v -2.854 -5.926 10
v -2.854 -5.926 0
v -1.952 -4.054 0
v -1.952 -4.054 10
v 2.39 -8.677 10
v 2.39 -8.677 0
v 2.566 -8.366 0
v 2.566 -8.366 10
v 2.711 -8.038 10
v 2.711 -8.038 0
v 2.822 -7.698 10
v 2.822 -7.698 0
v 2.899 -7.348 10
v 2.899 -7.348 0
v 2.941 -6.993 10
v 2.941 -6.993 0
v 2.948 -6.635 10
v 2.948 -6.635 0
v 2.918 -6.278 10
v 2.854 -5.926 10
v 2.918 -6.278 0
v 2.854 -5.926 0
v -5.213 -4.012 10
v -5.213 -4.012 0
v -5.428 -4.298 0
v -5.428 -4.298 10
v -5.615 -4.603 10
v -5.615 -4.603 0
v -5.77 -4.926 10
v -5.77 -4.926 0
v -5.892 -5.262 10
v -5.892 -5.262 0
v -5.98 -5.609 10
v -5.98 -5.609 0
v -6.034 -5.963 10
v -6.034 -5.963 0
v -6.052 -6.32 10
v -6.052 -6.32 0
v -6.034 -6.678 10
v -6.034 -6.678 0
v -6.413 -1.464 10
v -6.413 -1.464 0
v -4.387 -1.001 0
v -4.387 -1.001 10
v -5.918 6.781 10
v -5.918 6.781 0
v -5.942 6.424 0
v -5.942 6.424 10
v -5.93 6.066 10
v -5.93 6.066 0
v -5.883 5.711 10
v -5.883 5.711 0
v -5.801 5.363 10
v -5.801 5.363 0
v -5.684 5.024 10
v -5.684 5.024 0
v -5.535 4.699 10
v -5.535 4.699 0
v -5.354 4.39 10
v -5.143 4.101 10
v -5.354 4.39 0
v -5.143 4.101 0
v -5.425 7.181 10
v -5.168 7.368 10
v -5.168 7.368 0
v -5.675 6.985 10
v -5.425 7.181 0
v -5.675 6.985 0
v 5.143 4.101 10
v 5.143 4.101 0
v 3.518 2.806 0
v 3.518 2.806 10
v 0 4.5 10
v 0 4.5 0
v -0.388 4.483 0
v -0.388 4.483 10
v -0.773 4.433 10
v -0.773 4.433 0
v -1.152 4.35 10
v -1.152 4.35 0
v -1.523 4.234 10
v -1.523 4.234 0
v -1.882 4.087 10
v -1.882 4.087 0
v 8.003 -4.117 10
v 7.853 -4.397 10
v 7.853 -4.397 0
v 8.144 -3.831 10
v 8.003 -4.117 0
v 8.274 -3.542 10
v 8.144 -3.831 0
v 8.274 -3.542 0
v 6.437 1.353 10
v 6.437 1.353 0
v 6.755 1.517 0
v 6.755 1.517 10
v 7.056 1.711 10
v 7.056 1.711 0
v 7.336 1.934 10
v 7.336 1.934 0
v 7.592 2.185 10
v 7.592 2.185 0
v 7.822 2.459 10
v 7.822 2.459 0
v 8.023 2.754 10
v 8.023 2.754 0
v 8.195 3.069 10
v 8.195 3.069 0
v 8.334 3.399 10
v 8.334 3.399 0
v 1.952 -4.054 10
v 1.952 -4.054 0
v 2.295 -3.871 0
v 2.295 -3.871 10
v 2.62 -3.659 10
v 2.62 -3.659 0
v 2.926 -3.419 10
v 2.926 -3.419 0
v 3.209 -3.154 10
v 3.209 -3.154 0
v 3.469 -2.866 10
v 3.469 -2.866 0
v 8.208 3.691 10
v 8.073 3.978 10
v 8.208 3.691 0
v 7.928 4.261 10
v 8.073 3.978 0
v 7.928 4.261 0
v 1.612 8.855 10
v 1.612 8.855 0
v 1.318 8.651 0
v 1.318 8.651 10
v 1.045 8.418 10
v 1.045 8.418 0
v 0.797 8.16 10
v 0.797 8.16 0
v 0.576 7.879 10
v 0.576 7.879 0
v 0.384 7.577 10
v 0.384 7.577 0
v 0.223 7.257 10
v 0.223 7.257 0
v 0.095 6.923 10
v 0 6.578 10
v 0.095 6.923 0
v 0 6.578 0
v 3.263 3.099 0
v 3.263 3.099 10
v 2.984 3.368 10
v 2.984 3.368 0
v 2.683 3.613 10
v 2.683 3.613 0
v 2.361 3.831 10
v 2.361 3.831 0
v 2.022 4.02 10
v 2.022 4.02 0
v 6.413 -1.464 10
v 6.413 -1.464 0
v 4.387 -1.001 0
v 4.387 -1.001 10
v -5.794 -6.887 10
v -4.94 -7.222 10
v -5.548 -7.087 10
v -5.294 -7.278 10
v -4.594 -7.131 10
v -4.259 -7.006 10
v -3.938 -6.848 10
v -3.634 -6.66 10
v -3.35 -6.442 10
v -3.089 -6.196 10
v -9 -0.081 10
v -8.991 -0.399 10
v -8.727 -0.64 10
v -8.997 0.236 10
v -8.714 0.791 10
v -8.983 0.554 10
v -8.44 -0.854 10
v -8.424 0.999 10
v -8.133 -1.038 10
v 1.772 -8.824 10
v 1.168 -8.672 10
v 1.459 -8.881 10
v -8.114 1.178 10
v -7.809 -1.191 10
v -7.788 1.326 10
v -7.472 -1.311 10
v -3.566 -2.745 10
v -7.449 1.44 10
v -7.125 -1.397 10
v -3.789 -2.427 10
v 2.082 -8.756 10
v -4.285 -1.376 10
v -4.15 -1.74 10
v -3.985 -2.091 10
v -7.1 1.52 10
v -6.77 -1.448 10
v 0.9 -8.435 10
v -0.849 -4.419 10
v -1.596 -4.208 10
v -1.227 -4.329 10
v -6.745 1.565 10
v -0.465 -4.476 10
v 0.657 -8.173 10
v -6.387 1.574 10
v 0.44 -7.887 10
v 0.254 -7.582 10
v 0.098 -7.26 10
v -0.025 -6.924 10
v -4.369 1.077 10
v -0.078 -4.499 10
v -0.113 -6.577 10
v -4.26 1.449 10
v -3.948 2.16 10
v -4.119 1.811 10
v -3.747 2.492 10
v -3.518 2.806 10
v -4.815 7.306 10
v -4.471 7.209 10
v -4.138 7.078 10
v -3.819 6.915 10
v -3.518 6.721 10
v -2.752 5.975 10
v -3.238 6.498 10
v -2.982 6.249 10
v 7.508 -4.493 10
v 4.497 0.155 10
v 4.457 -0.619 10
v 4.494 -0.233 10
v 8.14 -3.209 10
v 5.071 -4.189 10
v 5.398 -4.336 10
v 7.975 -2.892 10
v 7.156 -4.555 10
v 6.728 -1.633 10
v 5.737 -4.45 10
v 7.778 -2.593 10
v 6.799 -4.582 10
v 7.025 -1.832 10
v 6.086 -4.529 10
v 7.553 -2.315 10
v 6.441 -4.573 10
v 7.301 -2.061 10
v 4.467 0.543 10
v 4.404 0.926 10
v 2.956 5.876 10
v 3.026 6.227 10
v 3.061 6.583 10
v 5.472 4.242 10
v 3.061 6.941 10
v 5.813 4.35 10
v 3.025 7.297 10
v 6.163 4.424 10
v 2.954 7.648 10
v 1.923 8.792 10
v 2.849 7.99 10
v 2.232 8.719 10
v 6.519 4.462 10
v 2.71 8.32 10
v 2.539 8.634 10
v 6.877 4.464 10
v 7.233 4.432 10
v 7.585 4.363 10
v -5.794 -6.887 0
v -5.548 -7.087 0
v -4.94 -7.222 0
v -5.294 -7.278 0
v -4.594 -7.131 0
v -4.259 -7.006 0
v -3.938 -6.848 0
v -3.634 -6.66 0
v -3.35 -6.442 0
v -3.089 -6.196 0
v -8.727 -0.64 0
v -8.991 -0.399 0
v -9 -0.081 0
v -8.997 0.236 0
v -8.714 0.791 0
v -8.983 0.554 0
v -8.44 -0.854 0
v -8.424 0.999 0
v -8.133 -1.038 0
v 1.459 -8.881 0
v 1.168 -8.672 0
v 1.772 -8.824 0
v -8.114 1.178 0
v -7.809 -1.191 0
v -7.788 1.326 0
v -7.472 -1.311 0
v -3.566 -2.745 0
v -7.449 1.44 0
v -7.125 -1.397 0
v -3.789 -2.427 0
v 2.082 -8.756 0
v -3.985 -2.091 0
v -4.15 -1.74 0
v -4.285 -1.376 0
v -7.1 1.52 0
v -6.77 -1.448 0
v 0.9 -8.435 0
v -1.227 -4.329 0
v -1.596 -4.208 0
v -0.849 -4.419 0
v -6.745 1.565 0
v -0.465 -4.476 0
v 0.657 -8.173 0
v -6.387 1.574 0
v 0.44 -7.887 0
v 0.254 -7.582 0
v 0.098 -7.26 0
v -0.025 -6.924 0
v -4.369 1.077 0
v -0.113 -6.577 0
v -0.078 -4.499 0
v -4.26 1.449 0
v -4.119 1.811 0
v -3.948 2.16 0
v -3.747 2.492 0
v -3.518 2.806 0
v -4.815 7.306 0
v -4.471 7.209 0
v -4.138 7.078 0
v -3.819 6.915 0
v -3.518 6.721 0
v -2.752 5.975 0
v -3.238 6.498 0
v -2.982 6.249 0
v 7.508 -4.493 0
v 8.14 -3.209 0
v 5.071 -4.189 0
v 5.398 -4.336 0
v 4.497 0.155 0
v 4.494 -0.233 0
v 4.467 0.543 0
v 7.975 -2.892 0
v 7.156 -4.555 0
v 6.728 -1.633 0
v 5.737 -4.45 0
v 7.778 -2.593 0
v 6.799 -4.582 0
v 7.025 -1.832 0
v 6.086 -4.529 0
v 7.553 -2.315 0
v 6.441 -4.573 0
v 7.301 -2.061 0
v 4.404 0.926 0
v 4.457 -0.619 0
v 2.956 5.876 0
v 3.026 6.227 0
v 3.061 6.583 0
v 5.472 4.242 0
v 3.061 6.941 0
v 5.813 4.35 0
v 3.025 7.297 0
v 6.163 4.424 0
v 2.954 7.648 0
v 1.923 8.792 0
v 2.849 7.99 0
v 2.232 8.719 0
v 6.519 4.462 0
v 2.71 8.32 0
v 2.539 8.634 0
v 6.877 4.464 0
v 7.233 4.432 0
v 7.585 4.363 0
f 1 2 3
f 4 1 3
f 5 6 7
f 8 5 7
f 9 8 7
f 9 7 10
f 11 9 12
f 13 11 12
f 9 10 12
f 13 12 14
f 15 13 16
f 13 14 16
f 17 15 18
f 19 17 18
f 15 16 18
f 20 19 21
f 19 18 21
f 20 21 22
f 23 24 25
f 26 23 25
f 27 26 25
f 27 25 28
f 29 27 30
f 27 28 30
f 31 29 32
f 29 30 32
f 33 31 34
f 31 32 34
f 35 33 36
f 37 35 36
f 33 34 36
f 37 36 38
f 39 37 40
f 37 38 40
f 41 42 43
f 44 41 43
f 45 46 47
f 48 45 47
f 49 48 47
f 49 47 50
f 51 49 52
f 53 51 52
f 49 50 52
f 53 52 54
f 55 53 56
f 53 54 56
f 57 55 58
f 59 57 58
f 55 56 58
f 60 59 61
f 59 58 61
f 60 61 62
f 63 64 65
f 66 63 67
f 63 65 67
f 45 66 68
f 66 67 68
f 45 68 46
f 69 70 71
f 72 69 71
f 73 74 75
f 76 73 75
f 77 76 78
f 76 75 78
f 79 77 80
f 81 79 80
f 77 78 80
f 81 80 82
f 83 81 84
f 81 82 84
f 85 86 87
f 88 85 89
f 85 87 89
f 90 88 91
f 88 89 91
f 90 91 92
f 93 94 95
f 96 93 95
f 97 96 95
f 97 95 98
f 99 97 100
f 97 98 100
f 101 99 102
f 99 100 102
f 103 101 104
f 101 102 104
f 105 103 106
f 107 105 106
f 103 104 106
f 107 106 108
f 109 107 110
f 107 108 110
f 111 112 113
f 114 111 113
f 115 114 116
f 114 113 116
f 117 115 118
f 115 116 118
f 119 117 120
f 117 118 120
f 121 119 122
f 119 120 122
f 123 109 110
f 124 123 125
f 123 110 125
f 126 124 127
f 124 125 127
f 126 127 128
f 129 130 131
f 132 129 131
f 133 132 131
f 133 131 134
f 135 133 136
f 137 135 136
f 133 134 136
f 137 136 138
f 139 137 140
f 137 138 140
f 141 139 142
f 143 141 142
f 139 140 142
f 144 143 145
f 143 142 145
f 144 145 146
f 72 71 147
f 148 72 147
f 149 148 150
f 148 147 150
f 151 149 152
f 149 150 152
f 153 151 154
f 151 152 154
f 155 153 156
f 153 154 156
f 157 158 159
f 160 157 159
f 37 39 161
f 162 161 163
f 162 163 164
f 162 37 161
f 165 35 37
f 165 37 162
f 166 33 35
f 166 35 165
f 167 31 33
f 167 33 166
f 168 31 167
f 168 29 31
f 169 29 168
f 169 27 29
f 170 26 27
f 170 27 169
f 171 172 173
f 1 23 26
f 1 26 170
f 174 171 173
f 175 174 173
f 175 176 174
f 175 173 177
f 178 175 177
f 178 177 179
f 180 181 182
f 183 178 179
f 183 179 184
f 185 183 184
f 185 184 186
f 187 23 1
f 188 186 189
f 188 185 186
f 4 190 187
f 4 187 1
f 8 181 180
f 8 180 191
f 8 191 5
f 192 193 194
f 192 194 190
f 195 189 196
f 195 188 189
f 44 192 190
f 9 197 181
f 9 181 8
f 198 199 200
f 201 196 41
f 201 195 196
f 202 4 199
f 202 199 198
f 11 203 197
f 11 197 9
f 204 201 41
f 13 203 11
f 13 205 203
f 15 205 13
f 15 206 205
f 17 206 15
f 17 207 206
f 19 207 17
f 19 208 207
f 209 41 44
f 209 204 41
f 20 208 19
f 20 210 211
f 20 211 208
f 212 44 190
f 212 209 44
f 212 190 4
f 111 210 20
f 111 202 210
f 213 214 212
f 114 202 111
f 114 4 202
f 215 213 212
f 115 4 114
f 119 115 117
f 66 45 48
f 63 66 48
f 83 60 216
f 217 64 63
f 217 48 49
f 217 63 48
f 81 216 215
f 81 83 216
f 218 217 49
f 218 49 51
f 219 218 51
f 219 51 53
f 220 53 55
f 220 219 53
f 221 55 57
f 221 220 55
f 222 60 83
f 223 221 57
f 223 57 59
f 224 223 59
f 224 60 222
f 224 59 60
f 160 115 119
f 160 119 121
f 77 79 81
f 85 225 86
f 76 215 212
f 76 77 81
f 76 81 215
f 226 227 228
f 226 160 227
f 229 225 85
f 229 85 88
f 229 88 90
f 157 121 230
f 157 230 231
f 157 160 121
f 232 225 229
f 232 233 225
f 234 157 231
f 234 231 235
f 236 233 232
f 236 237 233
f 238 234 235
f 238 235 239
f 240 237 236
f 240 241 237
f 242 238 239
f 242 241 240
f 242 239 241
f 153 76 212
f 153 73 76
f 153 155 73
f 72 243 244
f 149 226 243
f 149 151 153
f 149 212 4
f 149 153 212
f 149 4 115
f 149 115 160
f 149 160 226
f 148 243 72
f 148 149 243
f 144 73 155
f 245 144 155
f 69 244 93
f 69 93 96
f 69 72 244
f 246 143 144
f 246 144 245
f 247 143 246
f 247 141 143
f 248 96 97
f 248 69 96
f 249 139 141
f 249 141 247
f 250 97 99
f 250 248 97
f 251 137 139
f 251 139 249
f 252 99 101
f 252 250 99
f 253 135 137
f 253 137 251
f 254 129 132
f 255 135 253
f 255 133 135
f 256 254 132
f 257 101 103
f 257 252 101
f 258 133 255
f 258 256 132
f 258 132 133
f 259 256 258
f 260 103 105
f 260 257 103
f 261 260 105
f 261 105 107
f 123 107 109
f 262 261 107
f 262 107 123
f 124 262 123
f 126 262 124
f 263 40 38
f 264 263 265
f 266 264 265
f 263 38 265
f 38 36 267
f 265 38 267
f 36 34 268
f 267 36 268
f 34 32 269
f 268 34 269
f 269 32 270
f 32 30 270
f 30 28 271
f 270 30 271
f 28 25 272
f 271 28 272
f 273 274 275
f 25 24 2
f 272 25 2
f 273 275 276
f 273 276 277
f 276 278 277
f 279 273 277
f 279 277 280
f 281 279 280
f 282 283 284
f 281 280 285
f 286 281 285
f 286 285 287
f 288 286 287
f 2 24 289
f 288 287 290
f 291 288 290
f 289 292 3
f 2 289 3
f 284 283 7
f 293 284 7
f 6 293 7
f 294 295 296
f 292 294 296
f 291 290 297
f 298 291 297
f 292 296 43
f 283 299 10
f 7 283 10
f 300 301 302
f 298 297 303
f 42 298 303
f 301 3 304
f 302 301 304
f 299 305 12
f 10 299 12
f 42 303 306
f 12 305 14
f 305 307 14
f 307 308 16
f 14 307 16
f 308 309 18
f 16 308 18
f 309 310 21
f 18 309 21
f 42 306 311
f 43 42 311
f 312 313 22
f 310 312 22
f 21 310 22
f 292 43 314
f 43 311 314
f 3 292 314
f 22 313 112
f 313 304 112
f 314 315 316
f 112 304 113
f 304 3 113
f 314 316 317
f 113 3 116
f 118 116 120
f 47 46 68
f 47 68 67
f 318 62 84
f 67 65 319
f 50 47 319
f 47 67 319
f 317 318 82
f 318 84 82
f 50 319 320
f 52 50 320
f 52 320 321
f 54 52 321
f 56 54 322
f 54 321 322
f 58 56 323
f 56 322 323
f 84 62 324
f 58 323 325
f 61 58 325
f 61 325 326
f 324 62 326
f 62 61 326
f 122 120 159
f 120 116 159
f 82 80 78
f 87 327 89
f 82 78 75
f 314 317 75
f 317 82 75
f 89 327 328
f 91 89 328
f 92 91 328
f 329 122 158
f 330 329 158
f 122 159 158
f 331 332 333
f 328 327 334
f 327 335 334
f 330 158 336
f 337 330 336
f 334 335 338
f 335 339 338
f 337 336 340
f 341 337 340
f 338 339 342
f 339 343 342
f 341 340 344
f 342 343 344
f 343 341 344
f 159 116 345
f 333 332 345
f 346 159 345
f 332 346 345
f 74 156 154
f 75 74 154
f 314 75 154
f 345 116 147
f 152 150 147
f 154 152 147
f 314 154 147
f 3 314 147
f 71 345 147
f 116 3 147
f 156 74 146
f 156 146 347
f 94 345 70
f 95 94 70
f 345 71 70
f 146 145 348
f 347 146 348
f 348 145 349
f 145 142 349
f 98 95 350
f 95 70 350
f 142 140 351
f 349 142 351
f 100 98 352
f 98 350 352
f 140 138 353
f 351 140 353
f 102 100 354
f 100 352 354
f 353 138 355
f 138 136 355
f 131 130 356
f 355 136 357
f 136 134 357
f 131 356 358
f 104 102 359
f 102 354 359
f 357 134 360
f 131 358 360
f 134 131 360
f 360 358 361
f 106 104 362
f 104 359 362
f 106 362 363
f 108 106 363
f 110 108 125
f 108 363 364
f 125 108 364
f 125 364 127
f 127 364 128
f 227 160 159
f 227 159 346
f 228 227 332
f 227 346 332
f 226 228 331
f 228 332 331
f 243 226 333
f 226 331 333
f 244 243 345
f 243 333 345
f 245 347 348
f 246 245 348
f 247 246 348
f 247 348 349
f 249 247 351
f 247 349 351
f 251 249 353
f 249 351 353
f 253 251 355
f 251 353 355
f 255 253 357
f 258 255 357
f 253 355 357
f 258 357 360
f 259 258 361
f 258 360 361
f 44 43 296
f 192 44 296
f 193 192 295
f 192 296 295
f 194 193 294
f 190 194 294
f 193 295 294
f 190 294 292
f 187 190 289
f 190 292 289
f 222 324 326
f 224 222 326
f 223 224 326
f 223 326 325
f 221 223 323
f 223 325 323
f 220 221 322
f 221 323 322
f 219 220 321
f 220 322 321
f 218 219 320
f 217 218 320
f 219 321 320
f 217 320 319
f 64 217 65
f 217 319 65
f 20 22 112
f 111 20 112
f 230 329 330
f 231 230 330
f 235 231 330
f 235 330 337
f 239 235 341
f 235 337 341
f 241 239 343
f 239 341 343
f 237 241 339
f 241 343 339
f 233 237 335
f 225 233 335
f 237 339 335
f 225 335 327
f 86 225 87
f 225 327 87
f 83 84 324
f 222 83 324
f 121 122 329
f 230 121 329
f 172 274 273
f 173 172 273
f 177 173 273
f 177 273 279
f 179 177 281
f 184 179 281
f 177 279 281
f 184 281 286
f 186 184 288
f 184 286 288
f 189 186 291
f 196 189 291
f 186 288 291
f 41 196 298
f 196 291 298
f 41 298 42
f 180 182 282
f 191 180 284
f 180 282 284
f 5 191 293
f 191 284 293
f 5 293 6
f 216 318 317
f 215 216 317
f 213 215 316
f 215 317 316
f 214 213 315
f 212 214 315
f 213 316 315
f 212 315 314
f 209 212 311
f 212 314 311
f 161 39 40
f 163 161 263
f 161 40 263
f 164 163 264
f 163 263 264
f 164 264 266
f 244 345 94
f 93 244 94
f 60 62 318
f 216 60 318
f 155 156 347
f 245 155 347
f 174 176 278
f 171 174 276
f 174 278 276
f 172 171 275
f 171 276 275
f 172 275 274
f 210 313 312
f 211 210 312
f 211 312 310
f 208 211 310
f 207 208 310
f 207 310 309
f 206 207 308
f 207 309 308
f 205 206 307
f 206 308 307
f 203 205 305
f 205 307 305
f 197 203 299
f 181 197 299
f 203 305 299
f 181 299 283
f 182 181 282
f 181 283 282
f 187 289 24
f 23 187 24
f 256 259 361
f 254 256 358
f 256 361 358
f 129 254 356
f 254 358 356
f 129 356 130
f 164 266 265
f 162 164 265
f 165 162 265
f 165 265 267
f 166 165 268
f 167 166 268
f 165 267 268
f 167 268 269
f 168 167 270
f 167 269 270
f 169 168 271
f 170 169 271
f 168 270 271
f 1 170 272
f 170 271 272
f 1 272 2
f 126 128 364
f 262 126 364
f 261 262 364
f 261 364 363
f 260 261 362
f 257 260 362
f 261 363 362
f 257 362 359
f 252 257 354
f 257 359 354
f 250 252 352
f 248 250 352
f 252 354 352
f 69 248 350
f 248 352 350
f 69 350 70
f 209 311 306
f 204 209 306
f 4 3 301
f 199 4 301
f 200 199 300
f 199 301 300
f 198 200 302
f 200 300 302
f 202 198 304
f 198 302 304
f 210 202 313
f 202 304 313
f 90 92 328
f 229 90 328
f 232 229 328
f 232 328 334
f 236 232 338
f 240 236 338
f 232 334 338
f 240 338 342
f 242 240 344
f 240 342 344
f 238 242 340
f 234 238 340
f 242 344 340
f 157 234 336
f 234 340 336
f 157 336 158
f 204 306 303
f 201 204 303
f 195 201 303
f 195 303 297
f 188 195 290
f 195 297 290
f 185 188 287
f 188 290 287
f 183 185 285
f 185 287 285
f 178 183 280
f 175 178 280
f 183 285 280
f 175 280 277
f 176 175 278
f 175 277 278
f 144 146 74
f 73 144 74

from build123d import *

# Parameters (mm, degrees)
BOSS_EXTRU_1_DEPTH           = 10
R_P_TITION_CIRCULAIRE2_COUNT = 7
ESQUISSE5_R                  = 4.5
BOSS_EXTRU_2_DEPTH           = 10


with BuildPart() as part:
    # Esquisse4 → Boss.-Extru.1 (new body)
    with BuildSketch(Plane.XY):
        with BuildLine():
            Line((0, 6.577848346), (0, 4.5))
            ThreePointArc((0, 4.5), (1.039097311, 4.378387463), (2.022031395, 4.020123013))
            Line((2.022031395, 4.020123013), (2.955692415, 5.876391002))
            ThreePointArc((2.955692415, 5.876391002), (3.02541978, 7.297456647), (2.538901994, 8.634464469))
            ThreePointArc((2.538901994, 8.634464469), (2.078194622, 8.756774927), (1.611657757, 8.854521968))
            ThreePointArc((1.611657757, 8.854521968), (0.576250392, 7.878703818), (0, 6.577848346))
        make_face()
    extrude(amount=BOSS_EXTRU_1_DEPTH)


with BuildPart() as r_p_tition_circulaire2_1:
    # Répétition circulaire2: pattern copy
    add(part.part.rotate(Axis((0, 0, 0), (0, 0, 1)), 1 * 360 / R_P_TITION_CIRCULAIRE2_COUNT))


with BuildPart() as r_p_tition_circulaire2_2:
    # Répétition circulaire2: pattern copy
    add(part.part.rotate(Axis((0, 0, 0), (0, 0, 1)), 2 * 360 / R_P_TITION_CIRCULAIRE2_COUNT))


with BuildPart() as r_p_tition_circulaire2_3:
    # Répétition circulaire2: pattern copy
    add(part.part.rotate(Axis((0, 0, 0), (0, 0, 1)), 3 * 360 / R_P_TITION_CIRCULAIRE2_COUNT))


with BuildPart() as r_p_tition_circulaire2_4:
    # Répétition circulaire2: pattern copy
    add(part.part.rotate(Axis((0, 0, 0), (0, 0, 1)), 4 * 360 / R_P_TITION_CIRCULAIRE2_COUNT))


with BuildPart() as r_p_tition_circulaire2_5:
    # Répétition circulaire2: pattern copy
    add(part.part.rotate(Axis((0, 0, 0), (0, 0, 1)), 5 * 360 / R_P_TITION_CIRCULAIRE2_COUNT))


with BuildPart() as r_p_tition_circulaire2_6:
    # Répétition circulaire2: pattern copy
    add(part.part.rotate(Axis((0, 0, 0), (0, 0, 1)), 6 * 360 / R_P_TITION_CIRCULAIRE2_COUNT))


with BuildPart() as part_1:
    add(part.part)

    add(r_p_tition_circulaire2_1.part)  # Boss.-Extru.2 merges Répétition circulaire2_1

    add(r_p_tition_circulaire2_2.part)  # Boss.-Extru.2 merges Répétition circulaire2_2

    add(r_p_tition_circulaire2_3.part)  # Boss.-Extru.2 merges Répétition circulaire2_3

    add(r_p_tition_circulaire2_4.part)  # Boss.-Extru.2 merges Répétition circulaire2_4

    add(r_p_tition_circulaire2_5.part)  # Boss.-Extru.2 merges Répétition circulaire2_5

    add(r_p_tition_circulaire2_6.part)  # Boss.-Extru.2 merges Répétition circulaire2_6
    # Esquisse5 → Boss.-Extru.2 (add)
    with BuildSketch(Plane.XY):
        Circle(ESQUISSE5_R)
    extrude(amount=BOSS_EXTRU_2_DEPTH)


solid = part_1.part
